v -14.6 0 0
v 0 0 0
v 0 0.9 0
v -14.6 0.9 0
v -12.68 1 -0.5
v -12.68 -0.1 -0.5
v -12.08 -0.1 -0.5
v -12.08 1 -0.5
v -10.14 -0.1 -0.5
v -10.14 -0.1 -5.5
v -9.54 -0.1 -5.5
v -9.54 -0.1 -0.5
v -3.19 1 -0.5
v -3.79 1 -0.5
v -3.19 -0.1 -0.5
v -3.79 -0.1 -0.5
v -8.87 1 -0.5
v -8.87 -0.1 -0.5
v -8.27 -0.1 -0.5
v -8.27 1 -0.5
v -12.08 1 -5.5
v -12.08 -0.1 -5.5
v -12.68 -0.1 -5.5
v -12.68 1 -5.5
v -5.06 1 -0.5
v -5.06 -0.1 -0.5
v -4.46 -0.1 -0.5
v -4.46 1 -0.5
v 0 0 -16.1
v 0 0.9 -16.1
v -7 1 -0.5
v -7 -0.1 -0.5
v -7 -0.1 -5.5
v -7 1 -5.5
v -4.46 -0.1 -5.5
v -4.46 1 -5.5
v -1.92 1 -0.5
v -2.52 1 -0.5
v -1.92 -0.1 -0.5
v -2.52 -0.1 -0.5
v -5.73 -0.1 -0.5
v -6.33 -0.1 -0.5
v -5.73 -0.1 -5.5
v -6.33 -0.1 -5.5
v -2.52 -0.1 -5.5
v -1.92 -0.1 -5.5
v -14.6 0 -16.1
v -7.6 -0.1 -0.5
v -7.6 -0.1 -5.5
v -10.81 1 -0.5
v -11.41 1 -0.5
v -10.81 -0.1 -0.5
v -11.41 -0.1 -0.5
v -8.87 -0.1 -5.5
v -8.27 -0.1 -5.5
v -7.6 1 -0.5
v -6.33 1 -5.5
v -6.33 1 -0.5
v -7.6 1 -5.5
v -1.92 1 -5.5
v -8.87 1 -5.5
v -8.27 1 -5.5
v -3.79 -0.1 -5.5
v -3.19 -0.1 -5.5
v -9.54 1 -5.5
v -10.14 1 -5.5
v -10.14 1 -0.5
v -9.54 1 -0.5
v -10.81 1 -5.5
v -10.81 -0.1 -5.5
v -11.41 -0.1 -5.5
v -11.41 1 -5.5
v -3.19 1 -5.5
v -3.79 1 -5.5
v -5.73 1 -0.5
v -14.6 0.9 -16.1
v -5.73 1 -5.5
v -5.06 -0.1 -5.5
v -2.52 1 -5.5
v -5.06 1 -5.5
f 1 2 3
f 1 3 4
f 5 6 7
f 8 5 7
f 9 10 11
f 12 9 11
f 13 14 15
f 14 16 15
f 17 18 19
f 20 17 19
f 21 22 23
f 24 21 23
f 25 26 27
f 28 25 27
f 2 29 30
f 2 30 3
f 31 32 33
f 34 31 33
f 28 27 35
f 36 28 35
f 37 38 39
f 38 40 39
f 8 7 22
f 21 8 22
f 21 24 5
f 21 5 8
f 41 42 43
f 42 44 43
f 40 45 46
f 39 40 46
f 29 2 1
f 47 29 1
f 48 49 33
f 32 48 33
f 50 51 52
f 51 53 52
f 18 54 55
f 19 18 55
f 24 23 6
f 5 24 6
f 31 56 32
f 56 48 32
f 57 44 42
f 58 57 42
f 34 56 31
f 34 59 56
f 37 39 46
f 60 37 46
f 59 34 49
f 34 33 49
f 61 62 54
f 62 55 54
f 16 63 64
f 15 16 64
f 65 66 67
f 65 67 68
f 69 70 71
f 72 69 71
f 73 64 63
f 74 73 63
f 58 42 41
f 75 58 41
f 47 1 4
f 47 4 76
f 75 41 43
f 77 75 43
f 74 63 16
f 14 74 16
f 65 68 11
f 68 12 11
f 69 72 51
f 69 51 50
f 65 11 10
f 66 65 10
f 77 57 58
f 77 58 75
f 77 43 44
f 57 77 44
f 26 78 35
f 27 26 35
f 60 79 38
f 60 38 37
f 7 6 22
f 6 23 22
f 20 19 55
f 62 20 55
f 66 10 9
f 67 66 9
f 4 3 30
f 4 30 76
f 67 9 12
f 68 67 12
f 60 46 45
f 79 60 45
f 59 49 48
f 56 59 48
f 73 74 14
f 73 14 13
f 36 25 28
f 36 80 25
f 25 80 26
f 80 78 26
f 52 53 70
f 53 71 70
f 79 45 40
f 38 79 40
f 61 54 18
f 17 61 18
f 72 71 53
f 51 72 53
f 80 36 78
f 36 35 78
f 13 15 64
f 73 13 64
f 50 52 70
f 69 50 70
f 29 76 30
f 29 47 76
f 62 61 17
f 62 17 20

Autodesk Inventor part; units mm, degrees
ref_plane "YZ Plane" through (0, 0, 0) normal (1, 0, 0) x (0, 1, 0)
ref_plane "XZ Plane" through (0, 0, 0) normal (0, 1, 0) x (-1, 0, 0)
ref_plane "XY Plane" through (0, 0, 0) normal (0, 0, 1) x (1, 0, 0)
sketch "스케치1" plane through (0, 0, 0) normal (0, 1, 0) x (-1, 0, 0)
  line L0 (0, 0) -> (14.6, 0)
  line L1 (14.6, 0) -> (14.6, -16.1)
  line L2 (14.6, -16.1) -> (0, -16.1)
  line L3 (0, -16.1) -> (0, 0)
  dimension "d0" = 14.6
  dimension "d1" = 16.1
extrude "돌출1" add sketch "스케치1" along normal blind 0.9
sketch "스케치2" plane through (0, 0.9, 0) normal (0, 1, 0) x (1, 0, 0)
  line L0 (-12.68, 0.5) -> (-12.08, 0.5)
  line L1 (-12.08, 0.5) -> (-12.08, 5.5)
  line L2 (-12.08, 5.5) -> (-12.68, 5.5)
  line L3 (-12.68, 5.5) -> (-12.68, 0.5)
  line L4 (-14.6, 0) -> (0, 0) projected
  line L5 (-14.6, 16.1) -> (-14.6, 0) projected
  line L6 (-11.41, 0.5) -> (-10.81, 0.5)
  line L7 (-10.81, 0.5) -> (-10.81, 5.5)
  line L8 (-10.81, 5.5) -> (-11.41, 5.5)
  line L9 (-11.41, 5.5) -> (-11.41, 0.5)
  line L10 (-10.14, 0.5) -> (-9.54, 0.5)
  line L11 (-9.54, 0.5) -> (-9.54, 5.5)
  line L12 (-9.54, 5.5) -> (-10.14, 5.5)
  line L13 (-10.14, 5.5) -> (-10.14, 0.5)
  line L14 (-8.87, 0.5) -> (-8.27, 0.5)
  line L15 (-8.27, 0.5) -> (-8.27, 5.5)
  line L16 (-8.27, 5.5) -> (-8.87, 5.5)
  line L17 (-8.87, 5.5) -> (-8.87, 0.5)
  line L18 (-7.6, 0.5) -> (-7, 0.5)
  line L19 (-7, 0.5) -> (-7, 5.5)
  line L20 (-7, 5.5) -> (-7.6, 5.5)
  line L21 (-7.6, 5.5) -> (-7.6, 0.5)
  line L22 (-6.33, 0.5) -> (-5.73, 0.5)
  line L23 (-5.73, 0.5) -> (-5.73, 5.5)
  line L24 (-5.73, 5.5) -> (-6.33, 5.5)
  line L25 (-6.33, 5.5) -> (-6.33, 0.5)
  line L26 (-5.06, 0.5) -> (-4.46, 0.5)
  line L27 (-4.46, 0.5) -> (-4.46, 5.5)
  line L28 (-4.46, 5.5) -> (-5.06, 5.5)
  line L29 (-5.06, 5.5) -> (-5.06, 0.5)
  line L30 (-3.79, 0.5) -> (-3.19, 0.5)
  line L31 (-3.19, 0.5) -> (-3.19, 5.5)
  line L32 (-3.19, 5.5) -> (-3.79, 5.5)
  line L33 (-3.79, 5.5) -> (-3.79, 0.5)
  line L34 (-2.52, 0.5) -> (-1.92, 0.5)
  line L35 (-1.92, 0.5) -> (-1.92, 5.5)
  line L36 (-1.92, 5.5) -> (-2.52, 5.5)
  line L37 (-2.52, 5.5) -> (-2.52, 0.5)
  line L38 (0, 0) -> (0, 16.1) projected
  dimension "d4" = 0.6
  dimension "d5" = 5
  dimension "d6" = 0.5
  dimension "d7" = 1.92
  dimension "d10" = 1.27
  dimension "d15" = 1.92
extrude "돌출2" add sketch "스케치2" along normal blind 0.1 and the other way blind 1 separate body
properties part number "PCB"
